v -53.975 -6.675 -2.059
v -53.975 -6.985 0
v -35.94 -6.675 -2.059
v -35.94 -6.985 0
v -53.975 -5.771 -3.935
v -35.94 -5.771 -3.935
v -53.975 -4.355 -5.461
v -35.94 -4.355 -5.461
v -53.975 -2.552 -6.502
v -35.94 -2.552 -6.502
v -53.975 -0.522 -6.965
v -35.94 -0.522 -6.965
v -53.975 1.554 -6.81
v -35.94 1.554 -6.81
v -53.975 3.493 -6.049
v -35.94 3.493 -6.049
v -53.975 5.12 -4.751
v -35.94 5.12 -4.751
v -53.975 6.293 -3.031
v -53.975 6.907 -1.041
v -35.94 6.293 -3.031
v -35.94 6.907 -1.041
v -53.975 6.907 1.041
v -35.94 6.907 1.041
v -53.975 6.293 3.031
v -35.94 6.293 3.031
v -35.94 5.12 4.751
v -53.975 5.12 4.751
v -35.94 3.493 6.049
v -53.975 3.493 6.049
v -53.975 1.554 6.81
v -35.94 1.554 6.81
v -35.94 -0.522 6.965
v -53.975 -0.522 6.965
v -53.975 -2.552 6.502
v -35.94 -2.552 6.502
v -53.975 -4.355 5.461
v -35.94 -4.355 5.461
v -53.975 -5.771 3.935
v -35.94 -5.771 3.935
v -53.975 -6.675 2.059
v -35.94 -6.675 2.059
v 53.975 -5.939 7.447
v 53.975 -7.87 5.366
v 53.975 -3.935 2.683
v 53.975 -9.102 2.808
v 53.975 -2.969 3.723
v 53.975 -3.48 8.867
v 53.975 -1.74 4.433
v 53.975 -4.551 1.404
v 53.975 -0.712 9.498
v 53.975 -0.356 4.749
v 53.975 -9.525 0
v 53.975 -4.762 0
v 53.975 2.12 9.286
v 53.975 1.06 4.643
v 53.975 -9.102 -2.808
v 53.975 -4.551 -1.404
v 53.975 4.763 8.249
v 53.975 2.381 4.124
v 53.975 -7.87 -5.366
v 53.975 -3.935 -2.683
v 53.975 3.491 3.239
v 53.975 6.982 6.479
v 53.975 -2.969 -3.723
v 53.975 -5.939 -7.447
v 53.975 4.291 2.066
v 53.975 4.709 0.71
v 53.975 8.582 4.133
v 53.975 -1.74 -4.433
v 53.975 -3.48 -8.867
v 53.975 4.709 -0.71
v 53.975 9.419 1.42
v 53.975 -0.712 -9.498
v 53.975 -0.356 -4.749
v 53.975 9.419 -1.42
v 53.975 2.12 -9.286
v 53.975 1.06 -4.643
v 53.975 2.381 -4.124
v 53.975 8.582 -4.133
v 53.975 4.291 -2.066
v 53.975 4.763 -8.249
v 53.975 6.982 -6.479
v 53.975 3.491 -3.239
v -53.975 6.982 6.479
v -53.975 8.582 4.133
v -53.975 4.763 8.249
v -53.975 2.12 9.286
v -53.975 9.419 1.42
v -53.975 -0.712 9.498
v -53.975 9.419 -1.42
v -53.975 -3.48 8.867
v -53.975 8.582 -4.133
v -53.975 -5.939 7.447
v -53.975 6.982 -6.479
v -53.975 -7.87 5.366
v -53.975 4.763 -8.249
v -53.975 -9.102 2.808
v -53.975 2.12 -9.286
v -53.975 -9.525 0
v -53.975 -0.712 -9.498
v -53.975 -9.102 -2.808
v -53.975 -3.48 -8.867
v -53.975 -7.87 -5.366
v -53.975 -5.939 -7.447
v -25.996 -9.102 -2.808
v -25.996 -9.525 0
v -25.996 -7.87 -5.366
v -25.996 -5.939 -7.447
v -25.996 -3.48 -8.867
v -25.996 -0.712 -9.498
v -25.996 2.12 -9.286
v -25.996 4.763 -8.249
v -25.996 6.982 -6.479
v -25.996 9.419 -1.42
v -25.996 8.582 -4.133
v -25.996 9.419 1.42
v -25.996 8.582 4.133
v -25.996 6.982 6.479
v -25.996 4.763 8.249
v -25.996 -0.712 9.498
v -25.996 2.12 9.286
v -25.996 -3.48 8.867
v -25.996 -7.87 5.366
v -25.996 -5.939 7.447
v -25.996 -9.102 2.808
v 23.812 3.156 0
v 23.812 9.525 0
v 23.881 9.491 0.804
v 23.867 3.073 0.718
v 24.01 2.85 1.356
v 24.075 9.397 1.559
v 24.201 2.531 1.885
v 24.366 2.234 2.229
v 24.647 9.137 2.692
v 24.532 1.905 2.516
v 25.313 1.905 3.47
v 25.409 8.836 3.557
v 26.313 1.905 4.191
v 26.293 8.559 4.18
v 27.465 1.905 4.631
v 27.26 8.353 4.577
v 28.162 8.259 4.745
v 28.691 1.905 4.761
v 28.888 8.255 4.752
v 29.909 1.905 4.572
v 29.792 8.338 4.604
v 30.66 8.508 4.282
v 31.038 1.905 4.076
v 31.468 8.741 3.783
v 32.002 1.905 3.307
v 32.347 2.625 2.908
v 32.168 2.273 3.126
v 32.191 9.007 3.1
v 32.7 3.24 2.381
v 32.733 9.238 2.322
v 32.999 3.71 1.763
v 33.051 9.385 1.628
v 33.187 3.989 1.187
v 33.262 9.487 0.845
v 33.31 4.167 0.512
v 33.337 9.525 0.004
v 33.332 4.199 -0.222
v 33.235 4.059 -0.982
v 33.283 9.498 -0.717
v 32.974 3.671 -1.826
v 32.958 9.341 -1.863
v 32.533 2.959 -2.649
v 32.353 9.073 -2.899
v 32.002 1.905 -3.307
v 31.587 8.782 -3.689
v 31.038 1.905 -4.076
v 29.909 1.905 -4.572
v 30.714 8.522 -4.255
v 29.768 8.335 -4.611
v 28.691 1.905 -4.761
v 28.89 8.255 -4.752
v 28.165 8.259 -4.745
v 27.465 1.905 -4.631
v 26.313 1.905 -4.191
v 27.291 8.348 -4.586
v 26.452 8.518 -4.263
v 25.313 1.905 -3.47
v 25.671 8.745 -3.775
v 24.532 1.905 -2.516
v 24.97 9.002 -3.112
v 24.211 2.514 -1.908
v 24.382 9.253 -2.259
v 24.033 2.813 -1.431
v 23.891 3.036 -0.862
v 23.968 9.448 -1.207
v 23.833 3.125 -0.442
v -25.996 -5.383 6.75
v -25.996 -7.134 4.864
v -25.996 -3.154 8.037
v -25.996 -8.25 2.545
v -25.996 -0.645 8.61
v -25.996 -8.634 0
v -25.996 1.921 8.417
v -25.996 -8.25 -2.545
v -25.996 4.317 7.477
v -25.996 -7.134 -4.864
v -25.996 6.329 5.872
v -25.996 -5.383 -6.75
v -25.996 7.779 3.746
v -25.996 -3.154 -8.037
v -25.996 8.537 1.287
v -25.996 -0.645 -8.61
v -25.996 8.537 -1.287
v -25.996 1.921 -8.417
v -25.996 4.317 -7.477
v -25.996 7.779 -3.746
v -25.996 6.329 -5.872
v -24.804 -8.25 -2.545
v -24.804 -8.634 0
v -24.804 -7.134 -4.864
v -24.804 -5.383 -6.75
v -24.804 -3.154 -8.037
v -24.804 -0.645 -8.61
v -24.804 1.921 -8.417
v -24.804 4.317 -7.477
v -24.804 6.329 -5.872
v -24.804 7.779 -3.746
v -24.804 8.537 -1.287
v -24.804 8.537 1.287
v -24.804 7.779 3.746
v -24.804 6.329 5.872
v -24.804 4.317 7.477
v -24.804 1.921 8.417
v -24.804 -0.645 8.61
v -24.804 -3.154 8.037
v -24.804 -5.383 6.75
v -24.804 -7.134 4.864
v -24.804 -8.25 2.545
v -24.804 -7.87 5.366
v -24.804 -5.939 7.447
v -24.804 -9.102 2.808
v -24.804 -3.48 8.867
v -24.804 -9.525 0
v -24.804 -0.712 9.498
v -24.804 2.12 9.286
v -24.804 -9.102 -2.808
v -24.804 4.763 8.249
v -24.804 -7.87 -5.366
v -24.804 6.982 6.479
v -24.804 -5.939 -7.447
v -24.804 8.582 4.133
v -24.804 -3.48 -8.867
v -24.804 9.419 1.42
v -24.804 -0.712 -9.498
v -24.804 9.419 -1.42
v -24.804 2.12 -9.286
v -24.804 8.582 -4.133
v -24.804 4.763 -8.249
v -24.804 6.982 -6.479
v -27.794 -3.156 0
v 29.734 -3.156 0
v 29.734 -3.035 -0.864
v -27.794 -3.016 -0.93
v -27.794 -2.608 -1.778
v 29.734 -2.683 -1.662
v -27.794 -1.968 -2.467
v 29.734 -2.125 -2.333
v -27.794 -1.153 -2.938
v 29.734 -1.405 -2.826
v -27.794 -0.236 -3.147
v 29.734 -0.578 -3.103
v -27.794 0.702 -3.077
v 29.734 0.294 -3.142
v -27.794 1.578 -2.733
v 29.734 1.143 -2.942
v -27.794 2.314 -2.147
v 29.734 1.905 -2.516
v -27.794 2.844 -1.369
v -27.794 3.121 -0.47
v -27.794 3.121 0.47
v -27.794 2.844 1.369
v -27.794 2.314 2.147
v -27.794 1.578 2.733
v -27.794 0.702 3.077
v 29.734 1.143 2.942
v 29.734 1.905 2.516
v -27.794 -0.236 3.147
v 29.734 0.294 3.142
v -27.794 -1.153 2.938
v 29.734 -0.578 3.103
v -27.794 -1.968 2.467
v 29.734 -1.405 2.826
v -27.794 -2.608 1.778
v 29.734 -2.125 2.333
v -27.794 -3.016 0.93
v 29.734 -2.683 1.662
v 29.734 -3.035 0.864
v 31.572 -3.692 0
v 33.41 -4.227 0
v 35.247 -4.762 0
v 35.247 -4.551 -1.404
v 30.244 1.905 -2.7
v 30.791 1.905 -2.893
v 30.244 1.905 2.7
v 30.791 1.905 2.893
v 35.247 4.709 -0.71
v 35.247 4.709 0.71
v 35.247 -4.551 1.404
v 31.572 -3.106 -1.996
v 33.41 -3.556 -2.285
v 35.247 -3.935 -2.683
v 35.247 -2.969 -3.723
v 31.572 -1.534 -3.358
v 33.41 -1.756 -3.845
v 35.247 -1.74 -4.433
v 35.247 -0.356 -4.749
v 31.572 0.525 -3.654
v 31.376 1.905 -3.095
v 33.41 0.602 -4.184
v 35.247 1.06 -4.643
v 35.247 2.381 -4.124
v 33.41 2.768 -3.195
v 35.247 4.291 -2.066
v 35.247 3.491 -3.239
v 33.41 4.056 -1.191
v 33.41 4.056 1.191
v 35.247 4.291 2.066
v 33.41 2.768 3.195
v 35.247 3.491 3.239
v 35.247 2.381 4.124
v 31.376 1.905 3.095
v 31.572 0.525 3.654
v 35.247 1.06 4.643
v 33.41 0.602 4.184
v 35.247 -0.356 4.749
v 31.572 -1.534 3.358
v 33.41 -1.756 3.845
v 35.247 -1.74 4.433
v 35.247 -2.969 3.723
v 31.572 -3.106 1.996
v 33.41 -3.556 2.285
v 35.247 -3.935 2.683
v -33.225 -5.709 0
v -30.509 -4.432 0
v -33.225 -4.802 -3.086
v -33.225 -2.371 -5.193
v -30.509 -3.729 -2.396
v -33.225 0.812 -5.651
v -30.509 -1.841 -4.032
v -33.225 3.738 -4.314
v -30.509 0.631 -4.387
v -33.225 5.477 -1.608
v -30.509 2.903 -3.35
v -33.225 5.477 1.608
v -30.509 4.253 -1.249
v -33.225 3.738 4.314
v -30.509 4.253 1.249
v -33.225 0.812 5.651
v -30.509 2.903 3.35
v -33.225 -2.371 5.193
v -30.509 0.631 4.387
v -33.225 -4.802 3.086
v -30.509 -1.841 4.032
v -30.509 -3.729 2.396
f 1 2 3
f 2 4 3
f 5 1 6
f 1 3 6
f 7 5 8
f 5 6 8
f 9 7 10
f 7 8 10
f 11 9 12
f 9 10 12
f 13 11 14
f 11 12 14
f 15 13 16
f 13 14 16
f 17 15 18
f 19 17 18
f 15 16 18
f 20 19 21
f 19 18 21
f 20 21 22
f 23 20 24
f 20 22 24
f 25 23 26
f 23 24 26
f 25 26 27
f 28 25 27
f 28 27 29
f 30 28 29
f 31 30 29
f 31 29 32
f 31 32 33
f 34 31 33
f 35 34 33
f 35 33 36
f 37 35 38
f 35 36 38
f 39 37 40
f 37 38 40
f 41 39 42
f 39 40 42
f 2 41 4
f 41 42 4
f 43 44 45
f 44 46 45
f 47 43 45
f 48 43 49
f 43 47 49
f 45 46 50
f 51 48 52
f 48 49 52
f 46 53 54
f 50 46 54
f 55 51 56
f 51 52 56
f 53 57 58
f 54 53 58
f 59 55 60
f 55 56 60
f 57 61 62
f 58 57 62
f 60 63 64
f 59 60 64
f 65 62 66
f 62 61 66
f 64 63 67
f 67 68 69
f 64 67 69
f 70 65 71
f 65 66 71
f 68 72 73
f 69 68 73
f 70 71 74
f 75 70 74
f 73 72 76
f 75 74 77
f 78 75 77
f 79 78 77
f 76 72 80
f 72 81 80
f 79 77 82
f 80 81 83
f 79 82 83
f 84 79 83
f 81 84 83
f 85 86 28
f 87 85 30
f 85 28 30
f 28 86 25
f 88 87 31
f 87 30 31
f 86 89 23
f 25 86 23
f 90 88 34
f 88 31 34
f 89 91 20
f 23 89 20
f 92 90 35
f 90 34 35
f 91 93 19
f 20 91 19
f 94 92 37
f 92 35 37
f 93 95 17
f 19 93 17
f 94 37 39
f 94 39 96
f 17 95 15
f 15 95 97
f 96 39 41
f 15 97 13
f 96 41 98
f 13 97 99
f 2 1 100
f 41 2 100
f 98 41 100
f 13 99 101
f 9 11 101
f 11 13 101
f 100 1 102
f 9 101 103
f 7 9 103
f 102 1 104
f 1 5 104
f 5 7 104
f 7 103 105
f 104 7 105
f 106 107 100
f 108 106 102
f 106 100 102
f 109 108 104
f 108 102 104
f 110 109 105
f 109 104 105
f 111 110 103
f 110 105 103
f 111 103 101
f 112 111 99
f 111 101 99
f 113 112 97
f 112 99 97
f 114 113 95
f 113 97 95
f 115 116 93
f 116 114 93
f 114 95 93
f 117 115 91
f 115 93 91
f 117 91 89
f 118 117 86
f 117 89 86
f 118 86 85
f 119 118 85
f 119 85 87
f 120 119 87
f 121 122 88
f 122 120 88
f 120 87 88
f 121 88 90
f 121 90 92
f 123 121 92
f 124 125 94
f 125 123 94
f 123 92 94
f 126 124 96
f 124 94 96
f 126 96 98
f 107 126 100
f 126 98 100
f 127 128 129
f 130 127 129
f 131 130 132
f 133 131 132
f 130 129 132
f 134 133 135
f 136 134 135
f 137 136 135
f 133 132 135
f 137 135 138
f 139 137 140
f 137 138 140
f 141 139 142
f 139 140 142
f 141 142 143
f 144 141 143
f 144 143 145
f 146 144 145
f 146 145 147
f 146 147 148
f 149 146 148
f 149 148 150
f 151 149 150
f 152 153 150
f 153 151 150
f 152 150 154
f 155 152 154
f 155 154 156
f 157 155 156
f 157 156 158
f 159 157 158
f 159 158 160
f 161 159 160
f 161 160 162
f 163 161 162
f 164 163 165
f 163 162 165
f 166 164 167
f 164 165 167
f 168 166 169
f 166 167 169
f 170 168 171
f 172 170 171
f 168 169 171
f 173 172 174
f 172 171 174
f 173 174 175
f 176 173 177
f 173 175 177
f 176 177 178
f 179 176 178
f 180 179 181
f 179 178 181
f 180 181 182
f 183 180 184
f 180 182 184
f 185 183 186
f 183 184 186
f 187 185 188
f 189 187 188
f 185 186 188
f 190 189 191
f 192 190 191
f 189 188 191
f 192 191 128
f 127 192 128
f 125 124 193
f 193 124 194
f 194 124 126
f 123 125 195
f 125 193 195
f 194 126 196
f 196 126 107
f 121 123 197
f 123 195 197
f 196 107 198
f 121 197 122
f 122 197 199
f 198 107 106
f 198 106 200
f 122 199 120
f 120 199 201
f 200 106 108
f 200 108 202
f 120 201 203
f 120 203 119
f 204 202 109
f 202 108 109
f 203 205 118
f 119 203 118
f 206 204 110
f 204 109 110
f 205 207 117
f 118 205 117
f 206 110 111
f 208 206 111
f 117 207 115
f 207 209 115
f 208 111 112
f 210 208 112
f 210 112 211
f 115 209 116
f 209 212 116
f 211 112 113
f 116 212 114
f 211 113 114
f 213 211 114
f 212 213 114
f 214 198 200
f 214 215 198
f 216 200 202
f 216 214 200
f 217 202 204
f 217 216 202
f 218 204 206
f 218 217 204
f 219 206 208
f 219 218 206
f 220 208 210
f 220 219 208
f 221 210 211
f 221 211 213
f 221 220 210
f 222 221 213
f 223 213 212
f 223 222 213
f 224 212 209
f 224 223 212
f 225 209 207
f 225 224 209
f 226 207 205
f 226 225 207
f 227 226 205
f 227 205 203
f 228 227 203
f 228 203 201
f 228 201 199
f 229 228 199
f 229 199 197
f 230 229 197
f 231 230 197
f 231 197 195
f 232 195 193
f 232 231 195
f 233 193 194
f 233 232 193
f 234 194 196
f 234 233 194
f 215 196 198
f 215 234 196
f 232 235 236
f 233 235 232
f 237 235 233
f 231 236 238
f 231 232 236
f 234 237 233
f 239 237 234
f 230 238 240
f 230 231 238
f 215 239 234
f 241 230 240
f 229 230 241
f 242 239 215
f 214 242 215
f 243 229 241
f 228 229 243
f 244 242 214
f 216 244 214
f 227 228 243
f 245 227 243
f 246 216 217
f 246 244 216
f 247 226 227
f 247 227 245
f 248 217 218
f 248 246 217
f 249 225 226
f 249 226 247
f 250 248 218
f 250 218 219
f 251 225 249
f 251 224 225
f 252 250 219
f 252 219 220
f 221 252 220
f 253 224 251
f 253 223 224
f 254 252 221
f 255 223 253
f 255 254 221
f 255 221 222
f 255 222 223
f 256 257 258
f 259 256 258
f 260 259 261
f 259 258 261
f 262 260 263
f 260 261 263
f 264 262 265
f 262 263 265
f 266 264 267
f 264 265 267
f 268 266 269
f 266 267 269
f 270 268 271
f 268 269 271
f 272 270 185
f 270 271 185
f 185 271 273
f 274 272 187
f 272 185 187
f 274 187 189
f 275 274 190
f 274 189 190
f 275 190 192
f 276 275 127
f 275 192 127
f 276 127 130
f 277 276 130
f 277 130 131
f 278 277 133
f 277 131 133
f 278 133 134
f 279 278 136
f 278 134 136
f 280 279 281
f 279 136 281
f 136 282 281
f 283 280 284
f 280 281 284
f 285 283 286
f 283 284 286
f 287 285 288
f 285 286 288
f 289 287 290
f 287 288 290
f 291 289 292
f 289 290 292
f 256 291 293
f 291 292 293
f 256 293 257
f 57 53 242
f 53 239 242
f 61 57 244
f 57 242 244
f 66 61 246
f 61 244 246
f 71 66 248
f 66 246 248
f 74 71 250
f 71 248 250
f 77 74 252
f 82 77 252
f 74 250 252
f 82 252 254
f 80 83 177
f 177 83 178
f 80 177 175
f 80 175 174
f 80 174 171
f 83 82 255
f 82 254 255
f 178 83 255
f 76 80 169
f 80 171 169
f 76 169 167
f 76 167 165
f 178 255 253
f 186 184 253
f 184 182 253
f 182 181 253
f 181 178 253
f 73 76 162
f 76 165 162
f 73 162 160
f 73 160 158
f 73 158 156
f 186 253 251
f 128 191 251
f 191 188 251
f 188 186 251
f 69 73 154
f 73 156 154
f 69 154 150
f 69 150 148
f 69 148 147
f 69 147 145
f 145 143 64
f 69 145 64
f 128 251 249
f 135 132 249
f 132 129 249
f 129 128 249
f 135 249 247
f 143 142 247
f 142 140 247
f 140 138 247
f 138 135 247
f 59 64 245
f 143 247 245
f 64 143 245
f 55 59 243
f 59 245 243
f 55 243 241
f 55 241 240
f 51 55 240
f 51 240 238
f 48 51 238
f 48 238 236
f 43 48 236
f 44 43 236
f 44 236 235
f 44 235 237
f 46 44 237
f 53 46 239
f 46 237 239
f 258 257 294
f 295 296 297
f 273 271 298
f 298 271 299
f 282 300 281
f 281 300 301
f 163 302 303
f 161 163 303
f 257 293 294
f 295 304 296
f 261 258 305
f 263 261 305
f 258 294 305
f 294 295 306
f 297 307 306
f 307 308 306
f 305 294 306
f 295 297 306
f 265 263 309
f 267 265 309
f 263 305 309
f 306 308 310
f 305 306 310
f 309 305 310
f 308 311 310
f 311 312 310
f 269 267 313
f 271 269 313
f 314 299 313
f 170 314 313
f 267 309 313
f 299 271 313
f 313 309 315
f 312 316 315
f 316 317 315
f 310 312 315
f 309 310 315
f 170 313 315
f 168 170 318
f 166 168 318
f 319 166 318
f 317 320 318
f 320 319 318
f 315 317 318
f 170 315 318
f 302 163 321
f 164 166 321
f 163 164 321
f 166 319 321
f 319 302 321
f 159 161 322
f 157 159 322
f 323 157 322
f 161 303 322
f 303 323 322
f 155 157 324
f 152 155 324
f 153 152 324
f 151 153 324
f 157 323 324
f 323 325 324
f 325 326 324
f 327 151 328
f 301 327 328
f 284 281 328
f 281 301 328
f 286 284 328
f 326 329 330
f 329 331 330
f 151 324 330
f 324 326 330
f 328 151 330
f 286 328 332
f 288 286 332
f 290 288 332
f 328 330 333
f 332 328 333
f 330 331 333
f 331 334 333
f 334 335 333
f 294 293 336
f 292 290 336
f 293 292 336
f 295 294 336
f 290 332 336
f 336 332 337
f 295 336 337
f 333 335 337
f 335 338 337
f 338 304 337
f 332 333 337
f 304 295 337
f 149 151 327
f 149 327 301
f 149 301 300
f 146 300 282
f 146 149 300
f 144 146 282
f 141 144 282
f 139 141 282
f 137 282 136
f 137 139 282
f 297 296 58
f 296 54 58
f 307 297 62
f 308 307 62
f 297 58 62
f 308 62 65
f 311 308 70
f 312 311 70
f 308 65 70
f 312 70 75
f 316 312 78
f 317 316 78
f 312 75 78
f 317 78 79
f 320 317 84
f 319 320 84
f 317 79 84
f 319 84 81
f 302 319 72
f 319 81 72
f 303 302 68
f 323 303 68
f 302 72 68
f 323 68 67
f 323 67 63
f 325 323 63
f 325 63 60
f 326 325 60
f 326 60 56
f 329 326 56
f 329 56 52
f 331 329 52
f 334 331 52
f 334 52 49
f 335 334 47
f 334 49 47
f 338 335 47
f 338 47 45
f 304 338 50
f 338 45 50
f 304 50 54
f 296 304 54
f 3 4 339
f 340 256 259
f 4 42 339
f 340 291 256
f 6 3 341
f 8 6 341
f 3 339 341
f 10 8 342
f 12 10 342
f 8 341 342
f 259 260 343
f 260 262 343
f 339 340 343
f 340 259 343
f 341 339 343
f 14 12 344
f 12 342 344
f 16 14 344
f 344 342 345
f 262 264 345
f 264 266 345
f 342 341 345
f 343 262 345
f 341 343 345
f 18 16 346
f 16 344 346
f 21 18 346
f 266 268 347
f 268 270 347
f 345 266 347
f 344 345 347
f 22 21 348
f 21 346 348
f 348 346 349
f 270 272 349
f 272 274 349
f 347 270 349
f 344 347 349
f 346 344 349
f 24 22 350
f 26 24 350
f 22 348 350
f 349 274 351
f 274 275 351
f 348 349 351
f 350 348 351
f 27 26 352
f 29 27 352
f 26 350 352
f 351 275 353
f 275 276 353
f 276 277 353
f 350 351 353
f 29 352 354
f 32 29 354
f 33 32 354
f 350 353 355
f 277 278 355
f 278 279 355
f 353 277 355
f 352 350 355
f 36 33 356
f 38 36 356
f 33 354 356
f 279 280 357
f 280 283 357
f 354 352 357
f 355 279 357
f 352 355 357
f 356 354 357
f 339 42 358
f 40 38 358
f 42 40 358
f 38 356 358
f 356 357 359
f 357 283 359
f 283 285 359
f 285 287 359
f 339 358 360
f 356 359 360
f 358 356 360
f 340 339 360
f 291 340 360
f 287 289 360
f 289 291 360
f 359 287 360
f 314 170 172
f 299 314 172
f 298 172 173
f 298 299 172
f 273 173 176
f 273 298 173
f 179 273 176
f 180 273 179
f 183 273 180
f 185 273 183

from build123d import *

# Parameters (mm, degrees)
SKETCH2_R          = 4.7625
CUT_EXTRUDE1_DEPTH = 7.62
SKETCH3_W          = 1.1913435
SKETCH3_H          = 1.782578162


with BuildPart() as part:
    # Sketch1 → Revolve1 (revolve)
    with BuildSketch(Plane.XY):
        Polygon((53.975, 9.525), (-53.975, 9.525), (-53.975, 6.985), (-35.940357238, 6.985), (-27.793652955, 3.156048987), (29.734276459, 3.156048987), (35.24717222, 4.7625), (53.975, 4.7625), align=None)
    revolve(axis=Axis((-53.975, 0, 0), (1, 0, 0)))

    # Sketch2 → Cut-Extrude1 (cut)
    with BuildSketch(Plane(origin=(0, 9.525, 0), x_dir=(1, 0, 0), z_dir=(0, 1, 0))):
        with Locations((28.575, 0)):
            Circle(SKETCH2_R)
    extrude(amount=-CUT_EXTRUDE1_DEPTH, mode=Mode.SUBTRACT)

    # Sketch3 → Cut-Revolve1 (revolve, cut)
    with BuildSketch(Plane(origin=(0, 0, 0), x_dir=(1, 0, 0), z_dir=(0, 1, 0))):
        with Locations((-25.4, 9.525)):
            Rectangle(SKETCH3_W, SKETCH3_H)
    revolve(axis=Axis((-53.975, 0, 0), (1, 0, 0)), mode=Mode.SUBTRACT)


solid = part.part
